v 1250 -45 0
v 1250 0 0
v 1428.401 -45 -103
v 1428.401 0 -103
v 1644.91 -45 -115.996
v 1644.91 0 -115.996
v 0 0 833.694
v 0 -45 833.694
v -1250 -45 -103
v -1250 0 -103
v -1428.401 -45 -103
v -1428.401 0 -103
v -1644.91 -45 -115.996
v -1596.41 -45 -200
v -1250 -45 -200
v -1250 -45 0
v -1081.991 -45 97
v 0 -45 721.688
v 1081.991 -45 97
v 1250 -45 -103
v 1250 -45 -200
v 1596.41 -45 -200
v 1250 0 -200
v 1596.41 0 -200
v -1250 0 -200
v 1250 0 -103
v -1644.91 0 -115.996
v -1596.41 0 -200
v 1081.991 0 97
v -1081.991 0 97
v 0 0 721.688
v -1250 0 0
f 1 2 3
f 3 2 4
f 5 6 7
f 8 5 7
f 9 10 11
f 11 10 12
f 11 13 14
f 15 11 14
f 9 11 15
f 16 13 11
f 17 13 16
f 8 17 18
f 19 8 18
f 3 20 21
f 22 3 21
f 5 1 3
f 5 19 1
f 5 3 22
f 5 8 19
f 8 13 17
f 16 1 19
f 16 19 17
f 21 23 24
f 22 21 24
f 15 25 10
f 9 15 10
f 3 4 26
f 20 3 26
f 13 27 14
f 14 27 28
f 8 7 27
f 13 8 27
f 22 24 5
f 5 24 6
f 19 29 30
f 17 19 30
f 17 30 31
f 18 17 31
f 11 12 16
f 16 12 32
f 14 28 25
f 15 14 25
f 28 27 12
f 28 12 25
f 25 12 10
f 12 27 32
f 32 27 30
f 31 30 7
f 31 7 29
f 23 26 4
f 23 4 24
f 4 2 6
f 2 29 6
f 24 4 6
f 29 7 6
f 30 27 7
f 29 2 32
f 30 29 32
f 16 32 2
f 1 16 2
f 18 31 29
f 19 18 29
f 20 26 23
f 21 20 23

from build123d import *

# Parameters (mm, degrees)
F1_DEPTH = 45


with BuildPart() as f1:
    # F0 (on Front) → F1 (new body)
    with BuildSketch(Plane.XZ):
        Polygon((0, 721.687836), (0, 833.693789), (-1644.910162, -115.995536), (-1596.410162, -200), (-1428.401233, -103), (-1250, 0), (-1081.991072, 97), align=None)
        Polygon((1596.410162, -200), (1644.910162, -115.995536), (0, 833.693789), (0, 721.687836), (1081.991072, 97), (1250, 0), (1428.401233, -103), align=None)
        Polygon((1250, 0), (1081.991072, 97), (0, 97), (0, 0), (1153, 0), align=None)
        Polygon((0, 97), (-1081.991072, 97), (-1250, 0), (-1153, 0), (0, 0), align=None)
        Polygon((-1428.401233, -103), (-1596.410162, -200), (-1250, -200), (-1250, -103), align=None)
        Polygon((1250, -200), (1596.410162, -200), (1428.401233, -103), (1250, -103), align=None)
    extrude(amount=F1_DEPTH)


solid = f1.part
